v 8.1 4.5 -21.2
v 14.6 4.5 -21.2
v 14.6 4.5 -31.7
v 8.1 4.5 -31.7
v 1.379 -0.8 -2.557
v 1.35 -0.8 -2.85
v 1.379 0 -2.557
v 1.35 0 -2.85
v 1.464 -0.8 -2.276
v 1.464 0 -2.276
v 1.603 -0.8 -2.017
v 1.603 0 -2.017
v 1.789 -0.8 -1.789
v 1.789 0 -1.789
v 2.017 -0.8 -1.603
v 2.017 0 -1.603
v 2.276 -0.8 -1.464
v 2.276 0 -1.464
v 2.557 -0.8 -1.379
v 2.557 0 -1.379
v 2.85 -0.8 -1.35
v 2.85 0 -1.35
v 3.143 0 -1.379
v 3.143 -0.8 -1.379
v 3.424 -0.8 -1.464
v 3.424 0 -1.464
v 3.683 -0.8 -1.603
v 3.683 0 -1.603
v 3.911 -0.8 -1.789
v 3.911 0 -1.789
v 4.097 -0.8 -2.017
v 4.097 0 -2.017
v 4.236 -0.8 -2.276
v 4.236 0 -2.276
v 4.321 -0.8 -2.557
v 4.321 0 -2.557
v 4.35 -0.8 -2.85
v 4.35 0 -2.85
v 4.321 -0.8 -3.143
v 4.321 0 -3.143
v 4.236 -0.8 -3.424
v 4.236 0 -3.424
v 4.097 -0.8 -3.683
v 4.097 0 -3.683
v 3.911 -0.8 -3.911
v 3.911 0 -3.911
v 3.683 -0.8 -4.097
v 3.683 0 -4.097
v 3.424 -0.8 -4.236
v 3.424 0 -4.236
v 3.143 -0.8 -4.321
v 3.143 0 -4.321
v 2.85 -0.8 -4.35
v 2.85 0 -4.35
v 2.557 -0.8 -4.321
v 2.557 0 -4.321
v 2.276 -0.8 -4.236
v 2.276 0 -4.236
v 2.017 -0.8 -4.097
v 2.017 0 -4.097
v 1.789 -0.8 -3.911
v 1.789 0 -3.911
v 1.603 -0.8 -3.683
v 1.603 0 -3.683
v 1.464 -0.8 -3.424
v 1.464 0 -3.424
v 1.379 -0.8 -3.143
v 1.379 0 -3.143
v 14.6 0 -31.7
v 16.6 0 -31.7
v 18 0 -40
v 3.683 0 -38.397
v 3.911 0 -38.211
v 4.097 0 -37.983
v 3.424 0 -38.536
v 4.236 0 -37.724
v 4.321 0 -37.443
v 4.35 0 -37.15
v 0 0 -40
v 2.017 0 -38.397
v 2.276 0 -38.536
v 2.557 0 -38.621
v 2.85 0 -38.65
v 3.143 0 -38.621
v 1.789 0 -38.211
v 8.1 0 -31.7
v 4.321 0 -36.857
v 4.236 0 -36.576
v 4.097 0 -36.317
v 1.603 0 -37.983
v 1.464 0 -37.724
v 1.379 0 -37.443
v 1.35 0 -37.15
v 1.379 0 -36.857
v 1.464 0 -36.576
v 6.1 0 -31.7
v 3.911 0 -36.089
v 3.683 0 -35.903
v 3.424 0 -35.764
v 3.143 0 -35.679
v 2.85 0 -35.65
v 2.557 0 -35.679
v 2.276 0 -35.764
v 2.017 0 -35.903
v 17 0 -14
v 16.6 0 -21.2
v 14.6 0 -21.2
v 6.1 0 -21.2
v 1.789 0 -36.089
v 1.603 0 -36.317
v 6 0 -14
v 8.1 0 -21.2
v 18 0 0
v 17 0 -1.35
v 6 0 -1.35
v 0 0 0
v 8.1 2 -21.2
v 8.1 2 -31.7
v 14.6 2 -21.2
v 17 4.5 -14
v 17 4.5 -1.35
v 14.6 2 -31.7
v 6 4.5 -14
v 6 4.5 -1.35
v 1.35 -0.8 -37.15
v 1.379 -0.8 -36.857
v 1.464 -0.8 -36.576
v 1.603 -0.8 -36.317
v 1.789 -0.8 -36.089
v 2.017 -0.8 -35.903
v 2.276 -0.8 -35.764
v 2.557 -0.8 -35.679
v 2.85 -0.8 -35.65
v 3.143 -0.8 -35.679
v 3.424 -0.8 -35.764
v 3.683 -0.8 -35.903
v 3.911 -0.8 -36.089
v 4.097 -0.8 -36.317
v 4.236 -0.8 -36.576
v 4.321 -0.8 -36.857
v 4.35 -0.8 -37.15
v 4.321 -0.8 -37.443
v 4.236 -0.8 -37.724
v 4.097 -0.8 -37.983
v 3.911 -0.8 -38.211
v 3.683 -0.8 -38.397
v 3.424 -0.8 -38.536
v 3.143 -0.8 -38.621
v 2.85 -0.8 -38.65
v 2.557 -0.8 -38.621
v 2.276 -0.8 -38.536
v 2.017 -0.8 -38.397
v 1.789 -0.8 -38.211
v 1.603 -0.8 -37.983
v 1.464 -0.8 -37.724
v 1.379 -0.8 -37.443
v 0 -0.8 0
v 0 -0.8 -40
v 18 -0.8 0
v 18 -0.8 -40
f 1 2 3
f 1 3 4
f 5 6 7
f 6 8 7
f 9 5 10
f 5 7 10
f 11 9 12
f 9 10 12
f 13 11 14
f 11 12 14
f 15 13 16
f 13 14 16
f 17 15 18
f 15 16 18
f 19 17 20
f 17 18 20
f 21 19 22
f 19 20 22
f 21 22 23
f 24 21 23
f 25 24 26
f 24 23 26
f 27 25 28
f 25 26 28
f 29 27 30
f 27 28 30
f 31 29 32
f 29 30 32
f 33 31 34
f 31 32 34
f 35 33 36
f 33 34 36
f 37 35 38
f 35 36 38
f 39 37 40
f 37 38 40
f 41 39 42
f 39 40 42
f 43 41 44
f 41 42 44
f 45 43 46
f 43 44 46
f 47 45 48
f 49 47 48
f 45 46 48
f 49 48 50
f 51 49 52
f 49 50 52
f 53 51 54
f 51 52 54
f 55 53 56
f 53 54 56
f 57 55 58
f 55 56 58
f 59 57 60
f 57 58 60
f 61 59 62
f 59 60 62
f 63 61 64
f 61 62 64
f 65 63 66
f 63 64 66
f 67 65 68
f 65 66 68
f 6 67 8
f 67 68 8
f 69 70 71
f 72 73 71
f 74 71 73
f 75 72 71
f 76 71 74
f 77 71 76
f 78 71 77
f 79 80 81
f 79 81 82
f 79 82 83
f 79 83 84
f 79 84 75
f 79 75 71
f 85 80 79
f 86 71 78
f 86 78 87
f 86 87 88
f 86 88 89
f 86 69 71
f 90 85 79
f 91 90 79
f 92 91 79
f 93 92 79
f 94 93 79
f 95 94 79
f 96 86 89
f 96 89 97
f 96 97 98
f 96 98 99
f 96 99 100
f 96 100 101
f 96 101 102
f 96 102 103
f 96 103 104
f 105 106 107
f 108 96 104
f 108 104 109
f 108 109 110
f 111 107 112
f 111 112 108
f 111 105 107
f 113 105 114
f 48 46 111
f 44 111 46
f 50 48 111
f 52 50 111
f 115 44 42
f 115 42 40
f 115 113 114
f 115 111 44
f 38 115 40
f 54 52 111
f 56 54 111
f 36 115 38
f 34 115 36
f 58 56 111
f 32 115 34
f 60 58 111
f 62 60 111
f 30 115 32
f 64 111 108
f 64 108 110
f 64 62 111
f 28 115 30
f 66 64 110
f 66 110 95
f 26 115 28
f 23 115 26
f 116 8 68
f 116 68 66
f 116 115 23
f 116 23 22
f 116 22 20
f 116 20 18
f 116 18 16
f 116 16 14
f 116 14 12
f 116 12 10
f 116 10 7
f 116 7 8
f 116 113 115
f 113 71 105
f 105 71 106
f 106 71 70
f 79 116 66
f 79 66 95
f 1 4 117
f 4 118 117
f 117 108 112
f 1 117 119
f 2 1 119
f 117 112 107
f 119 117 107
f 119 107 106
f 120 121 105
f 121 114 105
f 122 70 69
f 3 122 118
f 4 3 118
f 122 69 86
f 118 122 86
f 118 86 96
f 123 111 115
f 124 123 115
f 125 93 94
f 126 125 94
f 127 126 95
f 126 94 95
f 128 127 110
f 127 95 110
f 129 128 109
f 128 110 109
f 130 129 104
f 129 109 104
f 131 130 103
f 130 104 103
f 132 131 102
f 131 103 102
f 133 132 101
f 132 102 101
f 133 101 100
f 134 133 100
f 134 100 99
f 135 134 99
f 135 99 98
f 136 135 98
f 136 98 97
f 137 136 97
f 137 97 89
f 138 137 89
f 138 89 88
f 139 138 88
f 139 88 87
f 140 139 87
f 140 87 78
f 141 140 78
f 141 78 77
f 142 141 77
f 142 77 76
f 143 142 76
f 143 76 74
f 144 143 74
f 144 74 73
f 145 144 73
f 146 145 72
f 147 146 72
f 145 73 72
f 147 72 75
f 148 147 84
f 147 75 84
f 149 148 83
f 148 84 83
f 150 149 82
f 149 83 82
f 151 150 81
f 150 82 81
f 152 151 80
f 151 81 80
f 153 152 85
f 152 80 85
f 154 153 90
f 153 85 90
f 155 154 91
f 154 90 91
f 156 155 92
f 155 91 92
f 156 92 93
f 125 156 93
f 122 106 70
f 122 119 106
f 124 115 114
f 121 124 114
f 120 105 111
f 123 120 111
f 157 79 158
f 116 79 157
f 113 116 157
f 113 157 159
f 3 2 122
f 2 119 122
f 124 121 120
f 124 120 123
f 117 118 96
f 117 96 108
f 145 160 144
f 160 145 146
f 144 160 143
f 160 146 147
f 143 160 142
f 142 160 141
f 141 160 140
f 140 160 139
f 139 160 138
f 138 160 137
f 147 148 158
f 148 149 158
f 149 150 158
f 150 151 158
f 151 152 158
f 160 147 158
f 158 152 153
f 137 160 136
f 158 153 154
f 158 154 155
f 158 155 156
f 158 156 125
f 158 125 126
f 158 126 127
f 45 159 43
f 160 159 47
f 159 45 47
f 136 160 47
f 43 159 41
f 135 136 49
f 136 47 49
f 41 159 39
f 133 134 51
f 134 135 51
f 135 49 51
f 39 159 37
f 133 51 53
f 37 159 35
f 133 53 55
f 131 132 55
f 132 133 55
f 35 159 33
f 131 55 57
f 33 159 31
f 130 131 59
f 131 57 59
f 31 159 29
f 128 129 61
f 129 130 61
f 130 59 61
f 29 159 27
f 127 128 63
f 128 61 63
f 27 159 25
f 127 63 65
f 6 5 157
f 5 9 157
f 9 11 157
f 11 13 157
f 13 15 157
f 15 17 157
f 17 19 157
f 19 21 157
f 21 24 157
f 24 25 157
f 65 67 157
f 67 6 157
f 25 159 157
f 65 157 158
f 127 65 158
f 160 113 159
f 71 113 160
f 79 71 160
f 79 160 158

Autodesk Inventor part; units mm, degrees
ref_plane "YZ Plane" through (0, 0, 0) normal (1, 0, 0) x (0, 1, 0)
ref_plane "XZ Plane" through (0, 0, 0) normal (0, 1, 0) x (-1, 0, 0)
ref_plane "XY Plane" through (0, 0, 0) normal (0, 0, 1) x (1, 0, 0)
sketch "Sketch1" plane through (0, 0, 0) normal (0, 1, 0) x (-1, 0, 0)
  line L0 (0, 0) -> (-18, 0)
  line L1 (-18, 0) -> (-18, -40)
  line L2 (-18, -40) -> (0, -40)
  line L3 (0, -40) -> (0, 0)
  line L4 (-1.35, 0) -> (-1.35, -40)
  line L5 (0, -1.35) -> (-18, -1.35)
  line L6 (0, -38.65) -> (-18, -38.65)
  circle A0 centre (-2.85, -2.85) radius 1.5
  circle A1 centre (-2.85, -37.15) radius 1.5
  line L7 (-8.1, -21.2) -> (-14.6, -21.2)
  line L8 (-14.6, -21.2) -> (-14.6, -31.7)
  line L9 (-14.6, -31.7) -> (-8.1, -31.7)
  line L10 (-8.1, -31.7) -> (-8.1, -21.2)
  line L11 (-6, -1) -> (-17, -1)
  line L12 (-17, -1) -> (-17, -14)
  line L13 (-17, -14) -> (-6, -14)
  line L14 (-6, -14) -> (-6, -1)
  point P0 (-6, -1.35)
  point P1 (-17, -1.35)
  dimension "d0" = 18
  dimension "d1" = 40
  dimension "d2" = 1.35
  dimension "d3" = 1.35
  dimension "d4" = 1.35
  dimension "d5" = 3
  dimension "d6" = 3
  dimension "d7" = 6.5
  dimension "d8" = 10.5
  dimension "d11" = 8.1
  dimension "d12" = 8.3
  dimension "d13" = 11
  dimension "d14" = 13
  dimension "d16" = 1
  dimension "d17" = 1
extrude "Extrusion1" add sketch "Sketch1" against normal blind 0.8 contours L3 L5 L4 L0 | L4 L5 L14 L11 L12 L1 L0 | L3 L6 L4 L5 | L4 A0 L5 | L3 L2 L4 L6 | L5 L12 L13 L14 A0 L4 A1 L6 L1 | L6 A1 L4 | L4 L2 L1 L6 | L12 L11 L14 L5 | L5 L14 L13 L12 | L10 L9 L8 L7
extrude "Extrusion2" add sketch "Sketch1" along normal blind 4.5 contours L5 L14 L13 L12
extrude "Extrusion3" add sketch "Sketch1" along normal blind 4.5 contours L10 L9 L8 L7
chamfer "Chamfer1" distance 2 angle 45 2 edges at (8.1, 0, -26.45) (14.6, 0, -26.45)
properties part number "interface_board"
